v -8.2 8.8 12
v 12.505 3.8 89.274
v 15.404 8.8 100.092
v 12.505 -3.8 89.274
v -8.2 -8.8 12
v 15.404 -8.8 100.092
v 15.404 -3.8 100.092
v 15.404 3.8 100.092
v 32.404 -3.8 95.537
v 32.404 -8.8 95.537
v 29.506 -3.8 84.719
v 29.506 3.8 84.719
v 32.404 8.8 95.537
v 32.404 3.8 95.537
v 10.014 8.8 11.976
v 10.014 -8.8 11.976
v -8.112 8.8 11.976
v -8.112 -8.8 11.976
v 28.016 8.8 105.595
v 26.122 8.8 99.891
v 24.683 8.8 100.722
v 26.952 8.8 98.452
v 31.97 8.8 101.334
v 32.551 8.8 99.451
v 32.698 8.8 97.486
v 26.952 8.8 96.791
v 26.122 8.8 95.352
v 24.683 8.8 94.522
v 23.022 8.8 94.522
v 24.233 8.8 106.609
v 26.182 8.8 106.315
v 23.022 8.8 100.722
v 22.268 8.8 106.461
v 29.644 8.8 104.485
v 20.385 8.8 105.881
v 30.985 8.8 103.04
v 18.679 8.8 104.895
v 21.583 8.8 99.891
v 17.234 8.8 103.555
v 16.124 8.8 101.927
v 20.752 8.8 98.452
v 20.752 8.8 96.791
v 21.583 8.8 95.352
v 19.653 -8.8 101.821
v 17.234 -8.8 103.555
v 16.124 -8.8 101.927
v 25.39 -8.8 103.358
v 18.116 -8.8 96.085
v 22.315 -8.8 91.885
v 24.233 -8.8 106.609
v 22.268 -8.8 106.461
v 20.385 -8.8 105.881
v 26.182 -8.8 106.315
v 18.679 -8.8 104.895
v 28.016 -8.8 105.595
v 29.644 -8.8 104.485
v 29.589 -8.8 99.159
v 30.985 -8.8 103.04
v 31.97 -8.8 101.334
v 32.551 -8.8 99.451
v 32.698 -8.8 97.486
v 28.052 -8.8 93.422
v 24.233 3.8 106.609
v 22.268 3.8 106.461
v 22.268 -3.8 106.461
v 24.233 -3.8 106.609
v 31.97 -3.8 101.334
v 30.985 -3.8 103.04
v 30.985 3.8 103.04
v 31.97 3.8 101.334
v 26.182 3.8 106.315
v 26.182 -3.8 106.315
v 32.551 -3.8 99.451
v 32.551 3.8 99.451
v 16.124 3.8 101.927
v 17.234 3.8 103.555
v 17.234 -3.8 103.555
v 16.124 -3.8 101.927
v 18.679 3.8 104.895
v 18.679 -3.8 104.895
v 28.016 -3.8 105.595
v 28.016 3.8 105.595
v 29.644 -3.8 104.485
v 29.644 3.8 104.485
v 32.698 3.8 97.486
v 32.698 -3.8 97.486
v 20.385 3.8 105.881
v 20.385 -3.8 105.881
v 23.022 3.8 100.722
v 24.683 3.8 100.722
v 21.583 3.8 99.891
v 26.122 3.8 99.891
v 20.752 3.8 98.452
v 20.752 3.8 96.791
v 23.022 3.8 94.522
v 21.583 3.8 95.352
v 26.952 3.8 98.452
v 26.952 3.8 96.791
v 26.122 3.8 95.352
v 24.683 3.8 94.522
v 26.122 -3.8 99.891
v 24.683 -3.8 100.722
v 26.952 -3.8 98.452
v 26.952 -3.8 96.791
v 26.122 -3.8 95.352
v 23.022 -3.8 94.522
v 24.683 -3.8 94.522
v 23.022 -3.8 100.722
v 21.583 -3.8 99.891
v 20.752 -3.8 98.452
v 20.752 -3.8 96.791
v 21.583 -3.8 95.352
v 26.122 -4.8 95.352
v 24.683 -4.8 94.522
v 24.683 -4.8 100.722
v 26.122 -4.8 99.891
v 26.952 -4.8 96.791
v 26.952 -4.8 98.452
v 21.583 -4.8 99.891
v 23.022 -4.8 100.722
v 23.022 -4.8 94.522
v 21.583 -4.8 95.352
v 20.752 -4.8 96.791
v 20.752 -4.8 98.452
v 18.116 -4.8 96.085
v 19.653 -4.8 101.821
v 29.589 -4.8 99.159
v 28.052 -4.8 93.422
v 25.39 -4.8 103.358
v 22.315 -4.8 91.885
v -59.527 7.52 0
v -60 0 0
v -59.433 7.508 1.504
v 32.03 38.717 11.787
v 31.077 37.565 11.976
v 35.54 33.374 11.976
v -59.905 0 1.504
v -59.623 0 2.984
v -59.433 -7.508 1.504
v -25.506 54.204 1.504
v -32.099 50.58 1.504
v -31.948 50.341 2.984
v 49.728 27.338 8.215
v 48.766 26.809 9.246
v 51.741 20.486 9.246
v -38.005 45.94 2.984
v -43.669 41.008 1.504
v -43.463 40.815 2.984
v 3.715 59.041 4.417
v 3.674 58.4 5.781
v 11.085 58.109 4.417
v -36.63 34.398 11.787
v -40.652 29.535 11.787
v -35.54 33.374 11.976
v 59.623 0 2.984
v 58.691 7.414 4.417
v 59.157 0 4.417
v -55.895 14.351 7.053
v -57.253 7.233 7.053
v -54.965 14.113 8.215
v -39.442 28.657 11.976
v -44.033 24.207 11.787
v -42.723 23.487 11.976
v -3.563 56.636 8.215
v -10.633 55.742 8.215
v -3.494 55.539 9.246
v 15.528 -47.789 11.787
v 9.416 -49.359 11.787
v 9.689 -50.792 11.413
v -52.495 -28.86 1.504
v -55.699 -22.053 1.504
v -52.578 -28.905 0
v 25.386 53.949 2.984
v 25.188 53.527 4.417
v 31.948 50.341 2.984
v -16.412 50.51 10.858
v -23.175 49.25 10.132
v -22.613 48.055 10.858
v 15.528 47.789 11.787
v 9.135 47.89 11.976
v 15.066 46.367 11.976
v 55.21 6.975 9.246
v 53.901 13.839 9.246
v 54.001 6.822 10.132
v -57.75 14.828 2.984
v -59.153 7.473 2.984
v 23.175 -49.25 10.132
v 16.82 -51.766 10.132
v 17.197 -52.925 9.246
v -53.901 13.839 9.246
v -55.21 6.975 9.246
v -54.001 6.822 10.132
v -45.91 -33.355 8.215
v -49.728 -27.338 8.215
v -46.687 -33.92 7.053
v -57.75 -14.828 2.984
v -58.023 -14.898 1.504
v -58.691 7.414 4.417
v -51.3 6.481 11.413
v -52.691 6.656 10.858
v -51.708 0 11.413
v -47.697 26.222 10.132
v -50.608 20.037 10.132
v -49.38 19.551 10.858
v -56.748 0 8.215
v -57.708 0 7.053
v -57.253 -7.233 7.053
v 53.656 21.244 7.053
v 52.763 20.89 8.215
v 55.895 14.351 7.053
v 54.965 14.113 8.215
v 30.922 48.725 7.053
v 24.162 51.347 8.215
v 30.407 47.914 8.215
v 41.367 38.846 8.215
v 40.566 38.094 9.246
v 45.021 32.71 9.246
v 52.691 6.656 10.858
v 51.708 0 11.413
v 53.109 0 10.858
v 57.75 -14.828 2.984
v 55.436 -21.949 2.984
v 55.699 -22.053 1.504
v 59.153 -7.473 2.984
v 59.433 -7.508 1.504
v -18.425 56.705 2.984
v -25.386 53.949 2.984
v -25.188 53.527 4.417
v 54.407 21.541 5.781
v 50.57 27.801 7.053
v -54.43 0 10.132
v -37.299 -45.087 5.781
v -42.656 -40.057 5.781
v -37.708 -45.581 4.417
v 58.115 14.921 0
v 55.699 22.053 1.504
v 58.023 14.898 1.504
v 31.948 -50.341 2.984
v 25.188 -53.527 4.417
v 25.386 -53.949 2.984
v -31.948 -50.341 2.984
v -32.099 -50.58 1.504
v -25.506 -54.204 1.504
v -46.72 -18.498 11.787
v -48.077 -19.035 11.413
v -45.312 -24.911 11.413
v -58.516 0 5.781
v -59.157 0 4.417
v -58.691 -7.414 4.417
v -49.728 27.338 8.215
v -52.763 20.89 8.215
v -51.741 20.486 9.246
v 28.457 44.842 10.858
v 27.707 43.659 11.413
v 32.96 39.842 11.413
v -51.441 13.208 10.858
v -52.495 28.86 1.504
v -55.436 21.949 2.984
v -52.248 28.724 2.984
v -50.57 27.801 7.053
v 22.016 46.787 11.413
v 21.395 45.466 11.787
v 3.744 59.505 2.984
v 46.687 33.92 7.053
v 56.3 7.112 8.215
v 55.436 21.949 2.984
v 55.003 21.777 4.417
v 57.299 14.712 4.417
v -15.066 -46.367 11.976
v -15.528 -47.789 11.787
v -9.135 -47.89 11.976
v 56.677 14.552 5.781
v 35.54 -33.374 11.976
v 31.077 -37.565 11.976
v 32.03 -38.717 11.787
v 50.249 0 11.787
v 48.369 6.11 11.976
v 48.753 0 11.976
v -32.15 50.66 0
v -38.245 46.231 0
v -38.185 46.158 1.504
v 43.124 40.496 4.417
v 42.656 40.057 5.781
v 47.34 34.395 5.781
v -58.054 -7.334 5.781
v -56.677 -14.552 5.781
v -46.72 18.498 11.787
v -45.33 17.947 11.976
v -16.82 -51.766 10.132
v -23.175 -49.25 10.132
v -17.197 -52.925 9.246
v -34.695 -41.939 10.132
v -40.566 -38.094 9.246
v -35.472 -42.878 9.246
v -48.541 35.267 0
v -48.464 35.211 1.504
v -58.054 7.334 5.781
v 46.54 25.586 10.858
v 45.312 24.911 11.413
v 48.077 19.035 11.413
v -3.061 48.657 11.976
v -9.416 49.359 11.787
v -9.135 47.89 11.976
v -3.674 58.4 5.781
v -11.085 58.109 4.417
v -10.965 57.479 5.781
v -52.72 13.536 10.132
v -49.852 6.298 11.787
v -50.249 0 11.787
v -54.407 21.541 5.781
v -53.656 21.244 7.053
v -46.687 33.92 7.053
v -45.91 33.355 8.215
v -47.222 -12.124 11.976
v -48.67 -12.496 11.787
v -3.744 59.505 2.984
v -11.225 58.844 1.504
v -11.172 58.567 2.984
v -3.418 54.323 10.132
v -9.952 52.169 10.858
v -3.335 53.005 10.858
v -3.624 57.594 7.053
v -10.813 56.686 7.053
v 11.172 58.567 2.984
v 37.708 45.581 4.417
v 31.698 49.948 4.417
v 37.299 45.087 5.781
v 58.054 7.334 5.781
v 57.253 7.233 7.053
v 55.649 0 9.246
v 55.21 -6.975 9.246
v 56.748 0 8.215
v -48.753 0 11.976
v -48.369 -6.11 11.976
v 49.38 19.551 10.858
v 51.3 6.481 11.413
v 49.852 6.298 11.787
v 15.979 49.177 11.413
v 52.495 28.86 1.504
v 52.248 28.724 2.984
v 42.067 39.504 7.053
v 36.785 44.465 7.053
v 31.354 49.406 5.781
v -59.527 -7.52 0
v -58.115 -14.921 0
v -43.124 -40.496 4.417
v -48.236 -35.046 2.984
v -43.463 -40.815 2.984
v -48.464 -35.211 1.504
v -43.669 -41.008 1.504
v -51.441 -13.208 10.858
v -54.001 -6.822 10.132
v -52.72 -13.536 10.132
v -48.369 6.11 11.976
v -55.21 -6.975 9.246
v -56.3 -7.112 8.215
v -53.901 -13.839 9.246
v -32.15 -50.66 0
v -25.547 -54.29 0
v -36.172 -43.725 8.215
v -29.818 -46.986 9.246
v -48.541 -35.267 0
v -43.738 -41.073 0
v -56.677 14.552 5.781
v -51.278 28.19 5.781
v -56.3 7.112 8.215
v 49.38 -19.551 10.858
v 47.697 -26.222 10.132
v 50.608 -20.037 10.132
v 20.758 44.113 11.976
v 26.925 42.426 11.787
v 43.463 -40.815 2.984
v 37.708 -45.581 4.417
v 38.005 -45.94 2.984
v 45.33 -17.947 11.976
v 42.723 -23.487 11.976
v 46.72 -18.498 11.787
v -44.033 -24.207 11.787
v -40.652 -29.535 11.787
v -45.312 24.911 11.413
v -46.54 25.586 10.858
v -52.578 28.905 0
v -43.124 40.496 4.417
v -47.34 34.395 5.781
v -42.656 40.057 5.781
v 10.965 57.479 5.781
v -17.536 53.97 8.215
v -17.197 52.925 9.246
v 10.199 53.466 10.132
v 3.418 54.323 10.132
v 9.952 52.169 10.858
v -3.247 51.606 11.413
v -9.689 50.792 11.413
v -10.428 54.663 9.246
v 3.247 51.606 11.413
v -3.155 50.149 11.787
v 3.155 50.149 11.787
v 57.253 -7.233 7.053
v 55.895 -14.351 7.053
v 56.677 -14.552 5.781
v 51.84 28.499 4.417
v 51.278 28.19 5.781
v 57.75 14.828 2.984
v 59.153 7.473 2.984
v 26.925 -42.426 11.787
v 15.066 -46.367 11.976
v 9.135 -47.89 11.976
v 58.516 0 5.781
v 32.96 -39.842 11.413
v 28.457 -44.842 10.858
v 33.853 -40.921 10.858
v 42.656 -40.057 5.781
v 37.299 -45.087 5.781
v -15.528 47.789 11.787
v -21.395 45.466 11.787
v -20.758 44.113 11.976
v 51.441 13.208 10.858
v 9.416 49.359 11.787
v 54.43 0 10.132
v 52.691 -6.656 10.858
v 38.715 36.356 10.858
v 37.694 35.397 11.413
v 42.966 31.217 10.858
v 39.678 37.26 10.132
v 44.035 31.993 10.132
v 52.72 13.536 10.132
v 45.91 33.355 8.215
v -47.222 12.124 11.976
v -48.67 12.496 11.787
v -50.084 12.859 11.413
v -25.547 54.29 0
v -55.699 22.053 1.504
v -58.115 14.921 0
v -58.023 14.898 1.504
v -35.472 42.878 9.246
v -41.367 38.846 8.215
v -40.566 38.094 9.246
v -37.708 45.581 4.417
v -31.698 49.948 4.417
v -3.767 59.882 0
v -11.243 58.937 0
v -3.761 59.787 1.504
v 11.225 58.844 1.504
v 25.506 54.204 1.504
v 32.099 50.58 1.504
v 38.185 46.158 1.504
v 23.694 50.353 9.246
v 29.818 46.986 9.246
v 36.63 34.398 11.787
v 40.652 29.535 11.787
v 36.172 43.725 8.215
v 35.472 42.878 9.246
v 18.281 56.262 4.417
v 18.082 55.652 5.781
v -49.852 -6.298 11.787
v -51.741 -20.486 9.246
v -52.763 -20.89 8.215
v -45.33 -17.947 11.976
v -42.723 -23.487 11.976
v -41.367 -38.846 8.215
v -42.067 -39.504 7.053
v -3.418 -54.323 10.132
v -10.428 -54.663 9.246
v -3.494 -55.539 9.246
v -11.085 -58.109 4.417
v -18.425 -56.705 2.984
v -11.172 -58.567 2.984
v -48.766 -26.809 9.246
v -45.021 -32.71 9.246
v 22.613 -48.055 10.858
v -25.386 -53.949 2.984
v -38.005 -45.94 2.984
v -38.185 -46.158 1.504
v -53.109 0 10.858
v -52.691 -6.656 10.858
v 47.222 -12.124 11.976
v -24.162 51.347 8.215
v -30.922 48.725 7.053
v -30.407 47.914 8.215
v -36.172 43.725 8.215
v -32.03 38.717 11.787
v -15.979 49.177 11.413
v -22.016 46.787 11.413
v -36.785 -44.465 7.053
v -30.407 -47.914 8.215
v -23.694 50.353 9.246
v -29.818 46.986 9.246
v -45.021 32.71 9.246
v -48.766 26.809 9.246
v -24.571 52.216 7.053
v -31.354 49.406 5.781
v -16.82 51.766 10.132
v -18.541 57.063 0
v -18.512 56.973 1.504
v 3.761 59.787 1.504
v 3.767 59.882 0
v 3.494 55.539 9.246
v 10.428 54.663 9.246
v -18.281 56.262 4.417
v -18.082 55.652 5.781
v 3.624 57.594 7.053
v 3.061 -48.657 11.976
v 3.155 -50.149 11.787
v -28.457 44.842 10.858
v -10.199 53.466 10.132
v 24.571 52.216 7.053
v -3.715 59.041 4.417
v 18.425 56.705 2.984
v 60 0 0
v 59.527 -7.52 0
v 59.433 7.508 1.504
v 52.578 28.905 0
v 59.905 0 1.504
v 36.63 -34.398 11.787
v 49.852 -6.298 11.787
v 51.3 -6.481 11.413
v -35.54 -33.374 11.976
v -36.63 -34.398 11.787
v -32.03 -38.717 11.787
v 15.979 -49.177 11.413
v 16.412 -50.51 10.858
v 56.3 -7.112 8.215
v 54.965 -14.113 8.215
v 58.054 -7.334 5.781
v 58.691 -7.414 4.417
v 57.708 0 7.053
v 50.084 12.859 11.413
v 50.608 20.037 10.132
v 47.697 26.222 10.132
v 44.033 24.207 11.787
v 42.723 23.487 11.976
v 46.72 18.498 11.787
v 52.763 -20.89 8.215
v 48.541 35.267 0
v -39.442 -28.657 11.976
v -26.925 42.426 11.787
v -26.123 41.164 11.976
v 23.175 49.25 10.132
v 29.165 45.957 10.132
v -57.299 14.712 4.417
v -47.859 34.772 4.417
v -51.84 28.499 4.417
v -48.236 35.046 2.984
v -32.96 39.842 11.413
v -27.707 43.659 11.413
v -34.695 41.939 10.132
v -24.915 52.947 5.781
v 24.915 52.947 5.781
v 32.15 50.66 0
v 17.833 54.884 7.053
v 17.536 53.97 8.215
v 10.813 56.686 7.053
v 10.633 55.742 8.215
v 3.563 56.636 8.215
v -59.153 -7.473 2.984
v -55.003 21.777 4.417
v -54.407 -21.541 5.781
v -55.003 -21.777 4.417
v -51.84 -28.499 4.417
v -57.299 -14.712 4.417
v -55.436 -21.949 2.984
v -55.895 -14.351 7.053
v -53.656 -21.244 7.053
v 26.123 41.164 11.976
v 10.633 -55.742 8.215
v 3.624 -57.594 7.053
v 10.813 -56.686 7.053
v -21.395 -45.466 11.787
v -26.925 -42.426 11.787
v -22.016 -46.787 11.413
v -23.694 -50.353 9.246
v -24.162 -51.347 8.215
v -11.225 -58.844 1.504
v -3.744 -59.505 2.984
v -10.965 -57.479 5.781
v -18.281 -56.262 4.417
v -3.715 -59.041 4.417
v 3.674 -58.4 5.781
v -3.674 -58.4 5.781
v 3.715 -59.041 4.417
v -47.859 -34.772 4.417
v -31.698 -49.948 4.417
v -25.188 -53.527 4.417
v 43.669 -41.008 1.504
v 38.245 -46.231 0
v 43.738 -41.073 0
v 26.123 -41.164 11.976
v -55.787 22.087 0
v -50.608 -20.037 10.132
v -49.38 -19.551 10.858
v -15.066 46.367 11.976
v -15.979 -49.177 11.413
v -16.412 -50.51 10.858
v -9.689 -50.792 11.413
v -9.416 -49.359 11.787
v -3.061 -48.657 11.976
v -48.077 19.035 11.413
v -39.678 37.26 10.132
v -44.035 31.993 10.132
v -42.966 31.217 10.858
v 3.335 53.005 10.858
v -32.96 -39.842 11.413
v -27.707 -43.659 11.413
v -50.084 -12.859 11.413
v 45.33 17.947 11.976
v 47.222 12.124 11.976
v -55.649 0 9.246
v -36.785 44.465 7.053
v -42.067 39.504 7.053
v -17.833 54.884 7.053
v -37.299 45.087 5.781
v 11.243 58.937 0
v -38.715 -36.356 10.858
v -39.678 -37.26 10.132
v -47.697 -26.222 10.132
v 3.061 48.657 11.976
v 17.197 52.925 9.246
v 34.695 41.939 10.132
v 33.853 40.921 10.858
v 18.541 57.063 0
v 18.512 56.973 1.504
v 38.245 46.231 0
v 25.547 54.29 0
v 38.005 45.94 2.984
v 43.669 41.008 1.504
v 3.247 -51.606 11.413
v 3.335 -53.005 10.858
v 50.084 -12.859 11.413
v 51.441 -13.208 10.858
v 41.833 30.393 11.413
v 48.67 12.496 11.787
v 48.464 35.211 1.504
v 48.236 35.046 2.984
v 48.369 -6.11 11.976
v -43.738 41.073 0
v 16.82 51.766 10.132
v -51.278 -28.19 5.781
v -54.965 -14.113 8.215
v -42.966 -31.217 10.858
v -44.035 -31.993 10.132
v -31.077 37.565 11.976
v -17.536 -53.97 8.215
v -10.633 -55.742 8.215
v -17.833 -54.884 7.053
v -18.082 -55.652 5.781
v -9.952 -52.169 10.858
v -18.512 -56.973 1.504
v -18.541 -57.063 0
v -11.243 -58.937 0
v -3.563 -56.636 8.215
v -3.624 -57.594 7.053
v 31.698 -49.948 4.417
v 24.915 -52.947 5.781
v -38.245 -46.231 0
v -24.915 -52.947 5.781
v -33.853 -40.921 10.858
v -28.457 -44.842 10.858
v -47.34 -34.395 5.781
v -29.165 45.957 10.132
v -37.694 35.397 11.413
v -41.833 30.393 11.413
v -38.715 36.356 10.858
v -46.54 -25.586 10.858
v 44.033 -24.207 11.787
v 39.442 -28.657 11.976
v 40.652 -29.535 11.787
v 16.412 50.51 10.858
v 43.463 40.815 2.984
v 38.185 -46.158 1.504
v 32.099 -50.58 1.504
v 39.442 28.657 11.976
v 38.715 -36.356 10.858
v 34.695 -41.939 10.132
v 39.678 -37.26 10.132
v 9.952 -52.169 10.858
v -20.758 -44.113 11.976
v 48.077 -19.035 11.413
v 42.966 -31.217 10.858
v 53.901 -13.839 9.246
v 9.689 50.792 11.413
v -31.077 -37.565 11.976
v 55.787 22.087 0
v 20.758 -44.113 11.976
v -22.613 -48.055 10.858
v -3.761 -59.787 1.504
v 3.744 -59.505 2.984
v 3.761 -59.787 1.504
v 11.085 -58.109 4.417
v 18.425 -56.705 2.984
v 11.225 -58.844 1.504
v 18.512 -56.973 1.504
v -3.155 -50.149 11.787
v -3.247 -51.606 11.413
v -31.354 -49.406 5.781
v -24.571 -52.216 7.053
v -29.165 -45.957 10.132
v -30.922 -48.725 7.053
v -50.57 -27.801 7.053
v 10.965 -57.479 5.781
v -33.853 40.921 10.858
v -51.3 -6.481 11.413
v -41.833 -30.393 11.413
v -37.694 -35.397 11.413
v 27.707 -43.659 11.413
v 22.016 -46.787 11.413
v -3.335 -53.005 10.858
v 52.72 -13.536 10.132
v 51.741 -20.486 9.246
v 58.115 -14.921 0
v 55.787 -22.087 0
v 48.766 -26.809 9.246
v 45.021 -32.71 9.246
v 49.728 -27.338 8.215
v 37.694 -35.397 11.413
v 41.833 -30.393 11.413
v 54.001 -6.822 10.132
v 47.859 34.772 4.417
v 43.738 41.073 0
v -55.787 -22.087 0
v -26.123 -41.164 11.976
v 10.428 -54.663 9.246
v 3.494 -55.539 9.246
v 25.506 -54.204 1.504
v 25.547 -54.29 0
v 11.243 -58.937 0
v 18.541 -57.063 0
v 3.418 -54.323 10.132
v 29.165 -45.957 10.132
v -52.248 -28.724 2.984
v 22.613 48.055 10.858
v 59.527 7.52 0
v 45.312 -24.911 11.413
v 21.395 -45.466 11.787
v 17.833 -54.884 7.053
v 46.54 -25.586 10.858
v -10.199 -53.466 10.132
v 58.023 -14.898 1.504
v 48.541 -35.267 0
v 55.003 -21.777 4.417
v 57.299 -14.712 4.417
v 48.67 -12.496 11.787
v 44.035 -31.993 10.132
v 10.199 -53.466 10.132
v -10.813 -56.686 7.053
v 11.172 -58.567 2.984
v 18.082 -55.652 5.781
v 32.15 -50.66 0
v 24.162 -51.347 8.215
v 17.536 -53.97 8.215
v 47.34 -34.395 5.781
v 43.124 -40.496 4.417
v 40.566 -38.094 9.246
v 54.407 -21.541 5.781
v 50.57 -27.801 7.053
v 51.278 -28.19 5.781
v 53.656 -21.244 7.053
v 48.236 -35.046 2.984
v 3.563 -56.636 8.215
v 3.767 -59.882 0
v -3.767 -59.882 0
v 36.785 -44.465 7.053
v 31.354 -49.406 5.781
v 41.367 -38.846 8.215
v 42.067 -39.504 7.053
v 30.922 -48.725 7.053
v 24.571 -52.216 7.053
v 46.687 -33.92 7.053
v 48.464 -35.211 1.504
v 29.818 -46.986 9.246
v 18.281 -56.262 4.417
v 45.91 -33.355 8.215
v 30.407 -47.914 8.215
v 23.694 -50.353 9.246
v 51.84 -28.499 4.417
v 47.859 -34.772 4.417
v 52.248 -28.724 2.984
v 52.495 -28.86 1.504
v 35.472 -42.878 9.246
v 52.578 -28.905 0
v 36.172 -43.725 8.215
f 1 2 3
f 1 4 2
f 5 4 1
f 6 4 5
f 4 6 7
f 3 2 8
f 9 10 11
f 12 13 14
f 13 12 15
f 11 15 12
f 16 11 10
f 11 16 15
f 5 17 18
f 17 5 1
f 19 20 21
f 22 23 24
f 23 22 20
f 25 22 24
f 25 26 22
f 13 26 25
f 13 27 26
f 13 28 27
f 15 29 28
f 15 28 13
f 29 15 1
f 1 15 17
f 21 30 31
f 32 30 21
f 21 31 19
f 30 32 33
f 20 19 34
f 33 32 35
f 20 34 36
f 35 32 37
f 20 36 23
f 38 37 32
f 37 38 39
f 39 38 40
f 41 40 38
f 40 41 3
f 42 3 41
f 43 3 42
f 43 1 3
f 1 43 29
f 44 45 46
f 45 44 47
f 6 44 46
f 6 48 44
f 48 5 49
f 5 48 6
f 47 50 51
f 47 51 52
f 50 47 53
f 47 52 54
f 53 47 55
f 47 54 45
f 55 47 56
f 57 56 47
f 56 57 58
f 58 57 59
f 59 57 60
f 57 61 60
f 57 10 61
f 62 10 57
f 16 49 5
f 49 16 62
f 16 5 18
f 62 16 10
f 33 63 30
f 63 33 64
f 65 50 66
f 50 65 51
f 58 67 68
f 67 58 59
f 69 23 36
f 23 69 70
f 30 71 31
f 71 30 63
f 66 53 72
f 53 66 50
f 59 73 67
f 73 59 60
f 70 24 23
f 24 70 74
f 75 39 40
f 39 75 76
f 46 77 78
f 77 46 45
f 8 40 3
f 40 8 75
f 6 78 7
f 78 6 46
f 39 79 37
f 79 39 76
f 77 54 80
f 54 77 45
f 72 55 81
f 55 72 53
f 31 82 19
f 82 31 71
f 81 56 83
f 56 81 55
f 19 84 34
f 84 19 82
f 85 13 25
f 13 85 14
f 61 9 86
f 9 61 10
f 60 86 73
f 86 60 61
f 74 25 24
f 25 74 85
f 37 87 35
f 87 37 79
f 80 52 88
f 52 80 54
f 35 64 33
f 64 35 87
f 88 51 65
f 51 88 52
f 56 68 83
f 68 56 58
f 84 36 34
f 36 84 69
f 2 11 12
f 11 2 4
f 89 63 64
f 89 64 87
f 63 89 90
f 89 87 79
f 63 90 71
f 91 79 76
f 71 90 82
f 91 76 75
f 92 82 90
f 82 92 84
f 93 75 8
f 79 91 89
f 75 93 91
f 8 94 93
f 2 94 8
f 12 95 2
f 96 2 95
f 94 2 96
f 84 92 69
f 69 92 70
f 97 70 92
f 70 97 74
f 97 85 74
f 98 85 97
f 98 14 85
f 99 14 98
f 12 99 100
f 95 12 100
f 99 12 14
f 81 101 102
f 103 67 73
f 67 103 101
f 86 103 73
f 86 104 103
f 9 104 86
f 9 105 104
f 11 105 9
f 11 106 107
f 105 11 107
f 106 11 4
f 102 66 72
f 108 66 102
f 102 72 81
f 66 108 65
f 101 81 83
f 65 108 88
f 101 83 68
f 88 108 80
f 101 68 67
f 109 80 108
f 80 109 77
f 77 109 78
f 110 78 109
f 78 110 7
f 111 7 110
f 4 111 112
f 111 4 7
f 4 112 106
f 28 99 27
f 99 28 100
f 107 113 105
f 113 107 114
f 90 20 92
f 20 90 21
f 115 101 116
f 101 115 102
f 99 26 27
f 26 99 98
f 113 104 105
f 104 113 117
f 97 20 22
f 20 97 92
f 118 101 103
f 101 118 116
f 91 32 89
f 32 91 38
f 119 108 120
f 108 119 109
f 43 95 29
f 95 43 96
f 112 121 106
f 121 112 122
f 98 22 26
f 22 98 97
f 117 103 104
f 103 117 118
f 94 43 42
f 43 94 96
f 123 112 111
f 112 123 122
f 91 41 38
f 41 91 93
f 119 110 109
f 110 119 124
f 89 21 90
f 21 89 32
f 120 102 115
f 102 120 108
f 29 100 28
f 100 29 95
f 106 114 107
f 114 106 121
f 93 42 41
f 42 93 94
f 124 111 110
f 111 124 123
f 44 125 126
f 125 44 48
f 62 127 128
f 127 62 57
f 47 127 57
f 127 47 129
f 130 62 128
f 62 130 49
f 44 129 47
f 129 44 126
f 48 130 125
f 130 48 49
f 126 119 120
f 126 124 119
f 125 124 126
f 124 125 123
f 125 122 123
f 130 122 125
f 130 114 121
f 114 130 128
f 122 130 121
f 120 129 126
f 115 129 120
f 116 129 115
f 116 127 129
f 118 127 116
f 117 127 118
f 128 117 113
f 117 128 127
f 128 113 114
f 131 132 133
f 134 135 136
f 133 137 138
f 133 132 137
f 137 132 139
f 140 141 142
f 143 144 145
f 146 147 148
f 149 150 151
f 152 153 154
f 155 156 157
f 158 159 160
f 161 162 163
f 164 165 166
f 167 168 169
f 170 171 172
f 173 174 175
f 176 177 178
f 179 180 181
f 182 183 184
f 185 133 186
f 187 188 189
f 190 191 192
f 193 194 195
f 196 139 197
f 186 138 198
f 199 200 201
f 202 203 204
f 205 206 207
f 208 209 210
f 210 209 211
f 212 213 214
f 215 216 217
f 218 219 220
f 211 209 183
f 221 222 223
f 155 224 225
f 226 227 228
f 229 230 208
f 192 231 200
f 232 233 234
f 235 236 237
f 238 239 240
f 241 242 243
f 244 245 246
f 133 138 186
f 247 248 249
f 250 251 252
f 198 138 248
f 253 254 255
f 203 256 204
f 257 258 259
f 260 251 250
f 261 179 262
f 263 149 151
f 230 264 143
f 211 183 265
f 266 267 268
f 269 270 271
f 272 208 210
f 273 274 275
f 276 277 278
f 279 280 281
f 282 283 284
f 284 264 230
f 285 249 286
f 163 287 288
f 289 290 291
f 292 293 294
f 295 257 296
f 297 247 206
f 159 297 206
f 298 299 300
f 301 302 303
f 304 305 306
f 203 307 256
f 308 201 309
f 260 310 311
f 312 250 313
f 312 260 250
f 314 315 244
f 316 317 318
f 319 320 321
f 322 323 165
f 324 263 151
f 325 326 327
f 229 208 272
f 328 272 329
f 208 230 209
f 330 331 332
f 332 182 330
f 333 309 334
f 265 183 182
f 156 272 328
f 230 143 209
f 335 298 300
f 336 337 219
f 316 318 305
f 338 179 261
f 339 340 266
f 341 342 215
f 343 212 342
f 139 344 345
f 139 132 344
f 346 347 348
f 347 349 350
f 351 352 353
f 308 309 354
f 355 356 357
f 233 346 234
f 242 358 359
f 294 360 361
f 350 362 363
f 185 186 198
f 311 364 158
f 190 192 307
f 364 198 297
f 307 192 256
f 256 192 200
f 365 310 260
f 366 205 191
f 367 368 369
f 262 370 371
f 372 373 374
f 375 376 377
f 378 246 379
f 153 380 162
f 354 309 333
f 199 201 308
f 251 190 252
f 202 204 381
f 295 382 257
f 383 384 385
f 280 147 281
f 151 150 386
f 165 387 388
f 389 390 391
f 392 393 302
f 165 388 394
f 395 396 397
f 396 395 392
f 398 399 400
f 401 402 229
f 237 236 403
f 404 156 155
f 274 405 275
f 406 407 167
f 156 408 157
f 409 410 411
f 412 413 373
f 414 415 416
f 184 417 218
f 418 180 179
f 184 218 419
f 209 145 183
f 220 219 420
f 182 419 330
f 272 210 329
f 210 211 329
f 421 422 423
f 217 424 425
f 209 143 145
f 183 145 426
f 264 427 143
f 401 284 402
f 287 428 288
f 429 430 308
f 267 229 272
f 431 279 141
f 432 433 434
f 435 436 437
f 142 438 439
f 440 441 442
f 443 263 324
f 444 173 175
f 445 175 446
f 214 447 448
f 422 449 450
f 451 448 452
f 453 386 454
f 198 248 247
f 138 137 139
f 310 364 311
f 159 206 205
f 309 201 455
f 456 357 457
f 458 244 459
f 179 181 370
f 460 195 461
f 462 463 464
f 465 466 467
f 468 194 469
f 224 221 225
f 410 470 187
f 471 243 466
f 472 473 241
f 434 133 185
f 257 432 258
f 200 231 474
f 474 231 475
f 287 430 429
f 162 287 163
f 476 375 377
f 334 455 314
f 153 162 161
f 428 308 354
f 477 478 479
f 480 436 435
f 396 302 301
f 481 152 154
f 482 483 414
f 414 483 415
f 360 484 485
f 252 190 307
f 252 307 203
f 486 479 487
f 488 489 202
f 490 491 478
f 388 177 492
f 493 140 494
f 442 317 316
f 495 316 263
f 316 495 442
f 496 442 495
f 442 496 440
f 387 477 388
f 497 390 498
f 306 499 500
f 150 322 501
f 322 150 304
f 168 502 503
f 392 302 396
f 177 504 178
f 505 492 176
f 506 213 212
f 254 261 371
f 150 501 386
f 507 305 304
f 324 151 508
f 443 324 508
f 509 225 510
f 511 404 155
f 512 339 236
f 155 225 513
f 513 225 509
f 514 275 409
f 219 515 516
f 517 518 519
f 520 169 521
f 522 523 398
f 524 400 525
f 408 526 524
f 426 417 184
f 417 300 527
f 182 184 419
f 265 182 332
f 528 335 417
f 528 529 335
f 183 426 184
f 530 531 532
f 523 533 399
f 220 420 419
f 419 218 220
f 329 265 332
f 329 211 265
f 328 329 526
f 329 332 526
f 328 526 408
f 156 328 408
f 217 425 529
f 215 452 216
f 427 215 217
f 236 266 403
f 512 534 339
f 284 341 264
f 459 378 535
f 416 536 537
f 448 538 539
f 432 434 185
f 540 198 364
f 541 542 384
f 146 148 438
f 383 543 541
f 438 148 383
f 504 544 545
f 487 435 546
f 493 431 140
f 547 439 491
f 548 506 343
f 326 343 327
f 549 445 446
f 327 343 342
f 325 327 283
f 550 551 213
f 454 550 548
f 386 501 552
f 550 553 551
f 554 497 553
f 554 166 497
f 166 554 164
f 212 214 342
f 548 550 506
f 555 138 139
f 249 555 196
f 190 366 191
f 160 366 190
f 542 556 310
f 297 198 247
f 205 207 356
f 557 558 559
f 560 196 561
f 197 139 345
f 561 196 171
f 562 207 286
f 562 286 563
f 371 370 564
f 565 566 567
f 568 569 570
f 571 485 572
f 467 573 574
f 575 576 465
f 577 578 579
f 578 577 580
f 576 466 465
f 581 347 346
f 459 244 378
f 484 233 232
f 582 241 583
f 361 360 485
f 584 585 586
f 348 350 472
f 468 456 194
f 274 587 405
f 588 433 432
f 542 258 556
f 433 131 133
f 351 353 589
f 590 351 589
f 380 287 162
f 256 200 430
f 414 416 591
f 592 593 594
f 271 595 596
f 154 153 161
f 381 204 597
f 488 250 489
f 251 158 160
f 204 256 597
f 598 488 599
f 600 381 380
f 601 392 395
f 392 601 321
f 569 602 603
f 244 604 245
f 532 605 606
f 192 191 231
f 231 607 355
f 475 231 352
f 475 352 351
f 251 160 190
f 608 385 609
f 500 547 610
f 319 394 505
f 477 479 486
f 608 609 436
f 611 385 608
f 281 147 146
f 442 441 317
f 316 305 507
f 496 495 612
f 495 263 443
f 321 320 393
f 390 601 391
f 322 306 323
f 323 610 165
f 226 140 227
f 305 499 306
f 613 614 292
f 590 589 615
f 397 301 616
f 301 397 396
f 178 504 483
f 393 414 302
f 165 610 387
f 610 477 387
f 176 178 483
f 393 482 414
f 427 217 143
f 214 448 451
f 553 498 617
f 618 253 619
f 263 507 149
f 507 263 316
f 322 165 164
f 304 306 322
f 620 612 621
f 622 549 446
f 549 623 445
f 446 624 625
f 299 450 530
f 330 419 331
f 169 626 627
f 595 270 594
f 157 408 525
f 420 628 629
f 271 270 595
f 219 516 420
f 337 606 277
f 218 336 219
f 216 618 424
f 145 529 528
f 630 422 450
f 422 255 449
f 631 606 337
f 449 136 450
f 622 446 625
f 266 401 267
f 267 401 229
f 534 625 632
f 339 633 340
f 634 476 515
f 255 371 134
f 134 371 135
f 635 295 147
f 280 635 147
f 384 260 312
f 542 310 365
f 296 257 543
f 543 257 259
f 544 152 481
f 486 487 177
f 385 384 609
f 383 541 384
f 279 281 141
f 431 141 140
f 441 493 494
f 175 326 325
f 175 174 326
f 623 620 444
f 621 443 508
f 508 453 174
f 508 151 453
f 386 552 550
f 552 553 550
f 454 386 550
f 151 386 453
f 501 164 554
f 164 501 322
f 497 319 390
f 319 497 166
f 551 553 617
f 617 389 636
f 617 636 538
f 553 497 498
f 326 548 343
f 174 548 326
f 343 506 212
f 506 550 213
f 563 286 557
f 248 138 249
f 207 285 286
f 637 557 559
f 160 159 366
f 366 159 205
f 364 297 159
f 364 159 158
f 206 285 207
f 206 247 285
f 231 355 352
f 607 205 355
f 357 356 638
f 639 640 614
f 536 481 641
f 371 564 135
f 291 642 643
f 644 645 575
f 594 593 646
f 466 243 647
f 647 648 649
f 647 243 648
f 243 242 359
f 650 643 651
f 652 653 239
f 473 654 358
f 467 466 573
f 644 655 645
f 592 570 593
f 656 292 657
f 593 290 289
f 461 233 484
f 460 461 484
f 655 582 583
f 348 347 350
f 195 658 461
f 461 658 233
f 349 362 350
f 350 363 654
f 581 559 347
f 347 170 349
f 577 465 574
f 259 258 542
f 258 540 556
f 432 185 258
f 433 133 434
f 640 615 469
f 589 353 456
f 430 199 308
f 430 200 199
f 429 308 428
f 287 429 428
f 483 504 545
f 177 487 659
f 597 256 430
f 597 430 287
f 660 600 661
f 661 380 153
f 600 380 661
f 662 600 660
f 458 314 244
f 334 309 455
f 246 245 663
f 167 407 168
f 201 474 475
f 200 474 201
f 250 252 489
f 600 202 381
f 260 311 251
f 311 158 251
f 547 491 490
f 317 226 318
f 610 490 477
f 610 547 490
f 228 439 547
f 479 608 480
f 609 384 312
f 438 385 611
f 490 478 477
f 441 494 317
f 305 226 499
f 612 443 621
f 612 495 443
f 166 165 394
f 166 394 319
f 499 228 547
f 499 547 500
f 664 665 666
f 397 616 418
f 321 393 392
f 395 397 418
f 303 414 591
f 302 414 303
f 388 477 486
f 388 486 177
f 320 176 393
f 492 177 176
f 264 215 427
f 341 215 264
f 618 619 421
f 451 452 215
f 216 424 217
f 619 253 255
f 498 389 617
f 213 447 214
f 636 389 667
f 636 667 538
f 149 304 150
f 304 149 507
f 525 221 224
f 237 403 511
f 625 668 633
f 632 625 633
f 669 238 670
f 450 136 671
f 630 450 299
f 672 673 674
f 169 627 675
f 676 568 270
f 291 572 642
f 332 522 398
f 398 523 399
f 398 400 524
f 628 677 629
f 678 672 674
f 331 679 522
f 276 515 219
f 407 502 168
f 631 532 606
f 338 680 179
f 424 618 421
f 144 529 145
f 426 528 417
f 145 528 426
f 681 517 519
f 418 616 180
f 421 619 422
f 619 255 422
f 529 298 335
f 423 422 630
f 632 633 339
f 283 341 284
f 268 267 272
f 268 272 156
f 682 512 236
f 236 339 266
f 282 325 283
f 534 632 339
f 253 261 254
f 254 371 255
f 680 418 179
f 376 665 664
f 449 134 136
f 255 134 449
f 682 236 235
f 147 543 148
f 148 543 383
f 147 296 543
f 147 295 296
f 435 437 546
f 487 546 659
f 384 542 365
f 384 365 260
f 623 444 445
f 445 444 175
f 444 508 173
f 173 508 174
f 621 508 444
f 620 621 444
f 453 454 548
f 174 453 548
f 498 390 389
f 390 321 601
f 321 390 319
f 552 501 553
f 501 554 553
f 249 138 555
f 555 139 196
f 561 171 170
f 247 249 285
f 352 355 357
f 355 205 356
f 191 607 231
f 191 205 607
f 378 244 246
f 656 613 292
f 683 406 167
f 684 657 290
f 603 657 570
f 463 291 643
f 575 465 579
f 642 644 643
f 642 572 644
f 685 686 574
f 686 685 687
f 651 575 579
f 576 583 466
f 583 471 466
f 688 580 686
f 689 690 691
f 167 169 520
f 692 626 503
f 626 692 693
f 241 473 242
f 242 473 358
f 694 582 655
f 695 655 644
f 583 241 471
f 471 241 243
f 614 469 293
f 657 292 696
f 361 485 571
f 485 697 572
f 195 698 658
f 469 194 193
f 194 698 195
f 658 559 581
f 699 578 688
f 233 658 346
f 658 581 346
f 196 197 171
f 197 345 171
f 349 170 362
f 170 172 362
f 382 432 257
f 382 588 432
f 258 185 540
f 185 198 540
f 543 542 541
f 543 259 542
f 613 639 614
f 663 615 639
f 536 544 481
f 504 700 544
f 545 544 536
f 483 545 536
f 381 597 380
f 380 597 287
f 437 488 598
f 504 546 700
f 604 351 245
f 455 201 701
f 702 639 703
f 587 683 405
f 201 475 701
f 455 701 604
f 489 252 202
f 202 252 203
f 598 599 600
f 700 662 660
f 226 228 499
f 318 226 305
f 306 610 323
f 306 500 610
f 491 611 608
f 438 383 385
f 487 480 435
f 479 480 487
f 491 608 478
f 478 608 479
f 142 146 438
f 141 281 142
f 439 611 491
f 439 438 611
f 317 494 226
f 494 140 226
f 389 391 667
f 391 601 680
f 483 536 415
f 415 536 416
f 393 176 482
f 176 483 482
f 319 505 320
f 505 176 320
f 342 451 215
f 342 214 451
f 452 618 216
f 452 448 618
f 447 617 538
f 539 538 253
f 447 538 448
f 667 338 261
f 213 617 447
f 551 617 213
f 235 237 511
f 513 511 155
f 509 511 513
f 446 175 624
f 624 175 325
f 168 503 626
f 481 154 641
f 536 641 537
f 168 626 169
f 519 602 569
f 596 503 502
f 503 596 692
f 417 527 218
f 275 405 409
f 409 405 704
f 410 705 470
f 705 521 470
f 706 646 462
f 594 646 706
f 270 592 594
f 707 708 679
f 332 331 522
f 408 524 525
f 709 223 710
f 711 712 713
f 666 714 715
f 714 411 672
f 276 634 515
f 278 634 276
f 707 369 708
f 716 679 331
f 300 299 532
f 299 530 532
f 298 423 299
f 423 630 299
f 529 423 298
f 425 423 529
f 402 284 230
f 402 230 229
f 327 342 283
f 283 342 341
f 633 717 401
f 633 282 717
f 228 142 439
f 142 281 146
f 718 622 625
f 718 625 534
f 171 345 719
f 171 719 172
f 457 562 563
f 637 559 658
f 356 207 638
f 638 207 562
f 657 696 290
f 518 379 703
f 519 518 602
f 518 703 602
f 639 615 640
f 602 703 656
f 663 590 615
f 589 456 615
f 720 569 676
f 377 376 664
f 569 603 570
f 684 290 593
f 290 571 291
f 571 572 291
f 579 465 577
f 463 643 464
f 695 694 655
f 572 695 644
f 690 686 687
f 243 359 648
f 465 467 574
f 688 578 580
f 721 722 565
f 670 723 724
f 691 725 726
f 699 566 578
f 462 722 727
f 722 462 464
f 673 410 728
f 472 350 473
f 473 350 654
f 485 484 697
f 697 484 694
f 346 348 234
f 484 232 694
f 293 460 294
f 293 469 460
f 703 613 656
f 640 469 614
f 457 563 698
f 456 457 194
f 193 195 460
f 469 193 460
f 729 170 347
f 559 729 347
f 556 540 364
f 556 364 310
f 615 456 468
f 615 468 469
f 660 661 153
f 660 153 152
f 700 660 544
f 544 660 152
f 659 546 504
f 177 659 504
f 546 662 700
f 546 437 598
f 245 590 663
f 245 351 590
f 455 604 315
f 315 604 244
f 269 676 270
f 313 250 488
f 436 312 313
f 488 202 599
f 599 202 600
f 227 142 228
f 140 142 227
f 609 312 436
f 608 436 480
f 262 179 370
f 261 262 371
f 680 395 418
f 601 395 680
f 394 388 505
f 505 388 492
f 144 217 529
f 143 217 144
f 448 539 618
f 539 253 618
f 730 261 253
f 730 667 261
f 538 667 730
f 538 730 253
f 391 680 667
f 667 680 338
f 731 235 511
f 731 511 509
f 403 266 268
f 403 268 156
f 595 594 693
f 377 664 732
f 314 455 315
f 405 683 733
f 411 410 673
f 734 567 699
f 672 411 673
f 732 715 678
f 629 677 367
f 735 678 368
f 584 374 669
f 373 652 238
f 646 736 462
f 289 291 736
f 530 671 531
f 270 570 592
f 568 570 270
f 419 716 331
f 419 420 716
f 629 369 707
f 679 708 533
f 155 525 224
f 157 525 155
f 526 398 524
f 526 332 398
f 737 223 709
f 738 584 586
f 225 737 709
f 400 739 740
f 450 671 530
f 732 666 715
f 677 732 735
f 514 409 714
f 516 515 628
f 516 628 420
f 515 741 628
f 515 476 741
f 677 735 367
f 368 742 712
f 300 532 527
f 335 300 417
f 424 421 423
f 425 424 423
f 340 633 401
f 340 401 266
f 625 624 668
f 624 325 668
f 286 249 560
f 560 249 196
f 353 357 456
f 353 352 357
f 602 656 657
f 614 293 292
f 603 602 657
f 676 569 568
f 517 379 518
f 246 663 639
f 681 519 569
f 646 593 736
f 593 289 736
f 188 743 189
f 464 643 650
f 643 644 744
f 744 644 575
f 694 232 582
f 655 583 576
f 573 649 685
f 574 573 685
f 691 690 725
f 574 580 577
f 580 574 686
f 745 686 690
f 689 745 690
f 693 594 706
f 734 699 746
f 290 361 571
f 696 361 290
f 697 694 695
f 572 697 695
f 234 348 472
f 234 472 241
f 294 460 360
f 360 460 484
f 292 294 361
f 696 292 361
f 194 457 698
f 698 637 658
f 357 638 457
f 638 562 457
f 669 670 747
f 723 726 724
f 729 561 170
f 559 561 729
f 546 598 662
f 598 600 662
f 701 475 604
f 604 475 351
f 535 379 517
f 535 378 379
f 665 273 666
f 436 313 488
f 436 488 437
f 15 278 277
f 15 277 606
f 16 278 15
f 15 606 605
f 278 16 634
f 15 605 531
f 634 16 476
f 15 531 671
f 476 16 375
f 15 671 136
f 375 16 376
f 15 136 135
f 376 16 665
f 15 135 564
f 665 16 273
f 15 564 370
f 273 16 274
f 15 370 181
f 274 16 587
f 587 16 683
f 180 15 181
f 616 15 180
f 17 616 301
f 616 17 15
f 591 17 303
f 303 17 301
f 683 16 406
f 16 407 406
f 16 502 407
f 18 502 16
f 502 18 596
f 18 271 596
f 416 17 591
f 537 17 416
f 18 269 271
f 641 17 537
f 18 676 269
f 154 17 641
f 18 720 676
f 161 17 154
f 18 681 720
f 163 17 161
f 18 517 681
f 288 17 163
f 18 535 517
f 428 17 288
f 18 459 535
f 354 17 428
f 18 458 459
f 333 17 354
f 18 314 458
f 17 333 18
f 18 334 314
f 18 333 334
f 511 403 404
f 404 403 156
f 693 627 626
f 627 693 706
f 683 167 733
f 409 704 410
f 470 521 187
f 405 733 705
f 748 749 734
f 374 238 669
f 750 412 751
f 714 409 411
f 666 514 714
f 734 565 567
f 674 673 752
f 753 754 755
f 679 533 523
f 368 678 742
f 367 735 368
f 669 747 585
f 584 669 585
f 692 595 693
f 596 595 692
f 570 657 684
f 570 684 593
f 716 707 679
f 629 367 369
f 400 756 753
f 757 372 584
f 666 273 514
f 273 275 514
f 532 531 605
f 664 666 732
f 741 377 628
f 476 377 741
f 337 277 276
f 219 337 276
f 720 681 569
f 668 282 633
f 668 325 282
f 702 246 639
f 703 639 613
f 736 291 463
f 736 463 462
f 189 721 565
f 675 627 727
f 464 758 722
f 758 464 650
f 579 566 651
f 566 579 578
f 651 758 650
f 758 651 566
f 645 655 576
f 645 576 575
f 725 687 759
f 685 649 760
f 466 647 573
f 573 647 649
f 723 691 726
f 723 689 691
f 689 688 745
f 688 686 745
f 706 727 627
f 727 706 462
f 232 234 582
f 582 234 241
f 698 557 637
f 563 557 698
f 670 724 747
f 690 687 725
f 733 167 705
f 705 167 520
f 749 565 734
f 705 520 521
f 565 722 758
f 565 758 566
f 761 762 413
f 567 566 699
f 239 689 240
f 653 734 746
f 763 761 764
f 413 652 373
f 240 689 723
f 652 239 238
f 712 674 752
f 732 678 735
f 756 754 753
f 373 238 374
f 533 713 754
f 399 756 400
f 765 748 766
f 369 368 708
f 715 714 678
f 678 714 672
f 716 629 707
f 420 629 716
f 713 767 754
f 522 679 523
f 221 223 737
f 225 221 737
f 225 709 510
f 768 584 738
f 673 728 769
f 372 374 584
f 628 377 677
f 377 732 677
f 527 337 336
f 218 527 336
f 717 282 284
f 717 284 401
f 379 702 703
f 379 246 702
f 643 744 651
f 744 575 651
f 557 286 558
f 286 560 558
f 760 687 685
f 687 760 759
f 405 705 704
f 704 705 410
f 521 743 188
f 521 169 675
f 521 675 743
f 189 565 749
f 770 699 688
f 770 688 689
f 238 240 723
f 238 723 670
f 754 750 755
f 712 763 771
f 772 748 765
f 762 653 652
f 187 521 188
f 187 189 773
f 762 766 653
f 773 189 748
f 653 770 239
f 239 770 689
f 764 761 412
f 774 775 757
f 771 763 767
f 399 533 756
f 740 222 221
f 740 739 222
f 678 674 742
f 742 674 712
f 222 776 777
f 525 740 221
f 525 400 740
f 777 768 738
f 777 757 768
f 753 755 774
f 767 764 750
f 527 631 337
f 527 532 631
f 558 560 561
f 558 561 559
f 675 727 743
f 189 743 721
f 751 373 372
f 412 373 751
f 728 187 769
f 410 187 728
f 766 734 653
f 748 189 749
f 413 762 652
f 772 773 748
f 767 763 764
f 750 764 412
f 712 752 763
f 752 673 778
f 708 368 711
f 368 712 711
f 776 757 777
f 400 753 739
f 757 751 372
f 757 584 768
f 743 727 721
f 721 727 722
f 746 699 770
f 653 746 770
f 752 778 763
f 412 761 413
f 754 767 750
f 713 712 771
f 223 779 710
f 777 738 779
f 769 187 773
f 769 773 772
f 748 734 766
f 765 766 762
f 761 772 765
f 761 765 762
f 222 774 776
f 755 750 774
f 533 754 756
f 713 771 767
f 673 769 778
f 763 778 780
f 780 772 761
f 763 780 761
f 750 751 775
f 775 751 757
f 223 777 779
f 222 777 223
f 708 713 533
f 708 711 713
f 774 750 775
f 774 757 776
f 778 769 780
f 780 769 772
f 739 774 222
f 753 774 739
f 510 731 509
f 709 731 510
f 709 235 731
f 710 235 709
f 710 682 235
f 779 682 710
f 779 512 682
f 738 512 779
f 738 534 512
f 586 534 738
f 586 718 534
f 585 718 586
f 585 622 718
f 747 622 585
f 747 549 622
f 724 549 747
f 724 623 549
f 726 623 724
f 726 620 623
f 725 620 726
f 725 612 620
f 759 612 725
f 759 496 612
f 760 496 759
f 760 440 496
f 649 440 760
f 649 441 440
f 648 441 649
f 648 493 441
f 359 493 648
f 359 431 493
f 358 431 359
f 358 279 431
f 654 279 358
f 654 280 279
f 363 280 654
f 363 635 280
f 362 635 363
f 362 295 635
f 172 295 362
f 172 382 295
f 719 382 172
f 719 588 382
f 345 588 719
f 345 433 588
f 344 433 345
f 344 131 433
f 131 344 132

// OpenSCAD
//-----------------------------------------------------------------------------------
//libraries
//-----------------------------------------------------------------------------------
//polyholes lib is in local dir
use <MCAD/polyholes.scad>

//-----------------------------------------------------------------------------------
//global configuration settings
//-----------------------------------------------------------------------------------
//epsilon param, so differences are scaled and do not become manifold
de = 0.1; 

//-----------------------------------------------------------------------------------
//parametric settings (object dimensions)
//-----------------------------------------------------------------------------------
//length of arm section
P10 = 80;  
//length of bracket section
P12 = 20; 
//thickness of bracket arms
P20 = 5;
//clearance between bracket arms
P21 = 7.6; 
//height of foot
P30 = 2*P20+P21;
//distance of holes from top end of bracket arms
P40 = 9;
//holes diameter
P41 = 6.2; 
//bracket nut trap wrench size
P42 = 10.2; 
//bracket nut trap depth
P43 = 4;     
//Angle of arm (0..90)
Angle=75;

//Base Radius
BaseRadius=60;
//Base Height, radius of profile
BaseH=12;
module micholder()
{
    difference()
    {
        union()
        {
            //main body
            //translate([0, 0, 0])
                cube([P10+P12-P30/2, 2*P20+P21, P30]);
				translate([P10+P12-P30/2, P30, P30/2])
					 rotate([90,0,0])
						cylinder(r=P30/2, h= P30);
        }  //union 1

        union()
        {
            //cutout for bracket arms
            translate([P10, P20, -de])
                cube([P12+de, P21, P30+2*de]);

            //bracket arms bores
            translate([P10+P12-P40, -de, P30/2])
                rotate([-90, 0, 0])
                polyhole(d=P41, h=2*P20+P21+2*de);
            //and nut trap on south arm
            translate([P10+P12-P40, -de, P30/2])
                rotate([-90,0,0])
                cylinder(r = P42 / 2 / cos(180 / 6) + 0.05, h=P43+de, $fn=6);
 
        }  //union 2
    }  //difference
}

module base(r,R) {
	difference(){
		hull()
		rotate_extrude(convexity = 10, $fn=50)
			translate([R-r,0,0]) circle(r=r);
		translate([0,0,-r]) cylinder(r=2*R, h=r);
	}
}

difference(){
union(){
	translate([(2*P20+P21)/2,-P30/2, BaseH-cos(Angle)*P30]) rotate([0,-Angle,0]) micholder();
	base(BaseH,BaseRadius);
}
translate([0,0,-2*P30]) cylinder(r=BaseRadius, h=2*P30);
}
